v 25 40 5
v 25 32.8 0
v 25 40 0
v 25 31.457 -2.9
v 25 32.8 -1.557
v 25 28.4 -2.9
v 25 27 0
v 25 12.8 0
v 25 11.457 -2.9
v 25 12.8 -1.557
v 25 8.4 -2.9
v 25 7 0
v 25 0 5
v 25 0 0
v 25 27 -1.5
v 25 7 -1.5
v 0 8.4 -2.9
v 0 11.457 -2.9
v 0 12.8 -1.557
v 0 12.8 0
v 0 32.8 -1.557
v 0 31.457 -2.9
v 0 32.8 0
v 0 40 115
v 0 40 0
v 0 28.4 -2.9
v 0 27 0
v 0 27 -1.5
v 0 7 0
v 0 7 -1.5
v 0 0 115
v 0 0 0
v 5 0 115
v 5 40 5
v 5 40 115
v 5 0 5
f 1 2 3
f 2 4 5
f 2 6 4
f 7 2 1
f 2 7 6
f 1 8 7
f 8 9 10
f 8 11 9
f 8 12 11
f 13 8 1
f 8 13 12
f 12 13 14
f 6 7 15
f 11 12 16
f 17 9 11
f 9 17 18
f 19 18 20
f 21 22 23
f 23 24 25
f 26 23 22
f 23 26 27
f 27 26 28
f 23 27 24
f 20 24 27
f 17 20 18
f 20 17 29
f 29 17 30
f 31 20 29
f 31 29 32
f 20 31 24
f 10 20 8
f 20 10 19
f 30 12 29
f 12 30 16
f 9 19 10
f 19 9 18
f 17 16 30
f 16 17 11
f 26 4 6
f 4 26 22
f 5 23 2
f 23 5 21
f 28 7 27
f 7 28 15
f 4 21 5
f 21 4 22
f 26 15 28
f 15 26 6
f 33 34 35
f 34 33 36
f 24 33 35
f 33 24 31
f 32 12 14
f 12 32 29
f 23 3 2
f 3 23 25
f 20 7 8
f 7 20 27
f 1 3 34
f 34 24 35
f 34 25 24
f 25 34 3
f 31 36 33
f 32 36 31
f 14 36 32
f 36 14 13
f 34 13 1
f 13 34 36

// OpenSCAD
b=5.8;
cube([5,40,115],center=false);
cube([25,40,5],center=false);
difference() {
    translate([0,7,-b/2]) cube([25,b,3], center=false);
    translate([0,7+b-1,-b-1]) rotate ([45,0,0])cube([25,b,3], center=false);
    translate([0,9.8,-b+1.5]) rotate ([135,0,0])cube([25,b,3], center=false);
    
    };
difference() {    
    translate([0,27,-b/2]) cube([25,b,3], center=false);
    translate([0,27+b-1,-b-1]) rotate ([45,0,0])cube([25,b,3], center=false);
    translate([0,29.8,-b+1.5]) rotate ([135,0,0])cube([25,b,3], center=false);
    
    };
